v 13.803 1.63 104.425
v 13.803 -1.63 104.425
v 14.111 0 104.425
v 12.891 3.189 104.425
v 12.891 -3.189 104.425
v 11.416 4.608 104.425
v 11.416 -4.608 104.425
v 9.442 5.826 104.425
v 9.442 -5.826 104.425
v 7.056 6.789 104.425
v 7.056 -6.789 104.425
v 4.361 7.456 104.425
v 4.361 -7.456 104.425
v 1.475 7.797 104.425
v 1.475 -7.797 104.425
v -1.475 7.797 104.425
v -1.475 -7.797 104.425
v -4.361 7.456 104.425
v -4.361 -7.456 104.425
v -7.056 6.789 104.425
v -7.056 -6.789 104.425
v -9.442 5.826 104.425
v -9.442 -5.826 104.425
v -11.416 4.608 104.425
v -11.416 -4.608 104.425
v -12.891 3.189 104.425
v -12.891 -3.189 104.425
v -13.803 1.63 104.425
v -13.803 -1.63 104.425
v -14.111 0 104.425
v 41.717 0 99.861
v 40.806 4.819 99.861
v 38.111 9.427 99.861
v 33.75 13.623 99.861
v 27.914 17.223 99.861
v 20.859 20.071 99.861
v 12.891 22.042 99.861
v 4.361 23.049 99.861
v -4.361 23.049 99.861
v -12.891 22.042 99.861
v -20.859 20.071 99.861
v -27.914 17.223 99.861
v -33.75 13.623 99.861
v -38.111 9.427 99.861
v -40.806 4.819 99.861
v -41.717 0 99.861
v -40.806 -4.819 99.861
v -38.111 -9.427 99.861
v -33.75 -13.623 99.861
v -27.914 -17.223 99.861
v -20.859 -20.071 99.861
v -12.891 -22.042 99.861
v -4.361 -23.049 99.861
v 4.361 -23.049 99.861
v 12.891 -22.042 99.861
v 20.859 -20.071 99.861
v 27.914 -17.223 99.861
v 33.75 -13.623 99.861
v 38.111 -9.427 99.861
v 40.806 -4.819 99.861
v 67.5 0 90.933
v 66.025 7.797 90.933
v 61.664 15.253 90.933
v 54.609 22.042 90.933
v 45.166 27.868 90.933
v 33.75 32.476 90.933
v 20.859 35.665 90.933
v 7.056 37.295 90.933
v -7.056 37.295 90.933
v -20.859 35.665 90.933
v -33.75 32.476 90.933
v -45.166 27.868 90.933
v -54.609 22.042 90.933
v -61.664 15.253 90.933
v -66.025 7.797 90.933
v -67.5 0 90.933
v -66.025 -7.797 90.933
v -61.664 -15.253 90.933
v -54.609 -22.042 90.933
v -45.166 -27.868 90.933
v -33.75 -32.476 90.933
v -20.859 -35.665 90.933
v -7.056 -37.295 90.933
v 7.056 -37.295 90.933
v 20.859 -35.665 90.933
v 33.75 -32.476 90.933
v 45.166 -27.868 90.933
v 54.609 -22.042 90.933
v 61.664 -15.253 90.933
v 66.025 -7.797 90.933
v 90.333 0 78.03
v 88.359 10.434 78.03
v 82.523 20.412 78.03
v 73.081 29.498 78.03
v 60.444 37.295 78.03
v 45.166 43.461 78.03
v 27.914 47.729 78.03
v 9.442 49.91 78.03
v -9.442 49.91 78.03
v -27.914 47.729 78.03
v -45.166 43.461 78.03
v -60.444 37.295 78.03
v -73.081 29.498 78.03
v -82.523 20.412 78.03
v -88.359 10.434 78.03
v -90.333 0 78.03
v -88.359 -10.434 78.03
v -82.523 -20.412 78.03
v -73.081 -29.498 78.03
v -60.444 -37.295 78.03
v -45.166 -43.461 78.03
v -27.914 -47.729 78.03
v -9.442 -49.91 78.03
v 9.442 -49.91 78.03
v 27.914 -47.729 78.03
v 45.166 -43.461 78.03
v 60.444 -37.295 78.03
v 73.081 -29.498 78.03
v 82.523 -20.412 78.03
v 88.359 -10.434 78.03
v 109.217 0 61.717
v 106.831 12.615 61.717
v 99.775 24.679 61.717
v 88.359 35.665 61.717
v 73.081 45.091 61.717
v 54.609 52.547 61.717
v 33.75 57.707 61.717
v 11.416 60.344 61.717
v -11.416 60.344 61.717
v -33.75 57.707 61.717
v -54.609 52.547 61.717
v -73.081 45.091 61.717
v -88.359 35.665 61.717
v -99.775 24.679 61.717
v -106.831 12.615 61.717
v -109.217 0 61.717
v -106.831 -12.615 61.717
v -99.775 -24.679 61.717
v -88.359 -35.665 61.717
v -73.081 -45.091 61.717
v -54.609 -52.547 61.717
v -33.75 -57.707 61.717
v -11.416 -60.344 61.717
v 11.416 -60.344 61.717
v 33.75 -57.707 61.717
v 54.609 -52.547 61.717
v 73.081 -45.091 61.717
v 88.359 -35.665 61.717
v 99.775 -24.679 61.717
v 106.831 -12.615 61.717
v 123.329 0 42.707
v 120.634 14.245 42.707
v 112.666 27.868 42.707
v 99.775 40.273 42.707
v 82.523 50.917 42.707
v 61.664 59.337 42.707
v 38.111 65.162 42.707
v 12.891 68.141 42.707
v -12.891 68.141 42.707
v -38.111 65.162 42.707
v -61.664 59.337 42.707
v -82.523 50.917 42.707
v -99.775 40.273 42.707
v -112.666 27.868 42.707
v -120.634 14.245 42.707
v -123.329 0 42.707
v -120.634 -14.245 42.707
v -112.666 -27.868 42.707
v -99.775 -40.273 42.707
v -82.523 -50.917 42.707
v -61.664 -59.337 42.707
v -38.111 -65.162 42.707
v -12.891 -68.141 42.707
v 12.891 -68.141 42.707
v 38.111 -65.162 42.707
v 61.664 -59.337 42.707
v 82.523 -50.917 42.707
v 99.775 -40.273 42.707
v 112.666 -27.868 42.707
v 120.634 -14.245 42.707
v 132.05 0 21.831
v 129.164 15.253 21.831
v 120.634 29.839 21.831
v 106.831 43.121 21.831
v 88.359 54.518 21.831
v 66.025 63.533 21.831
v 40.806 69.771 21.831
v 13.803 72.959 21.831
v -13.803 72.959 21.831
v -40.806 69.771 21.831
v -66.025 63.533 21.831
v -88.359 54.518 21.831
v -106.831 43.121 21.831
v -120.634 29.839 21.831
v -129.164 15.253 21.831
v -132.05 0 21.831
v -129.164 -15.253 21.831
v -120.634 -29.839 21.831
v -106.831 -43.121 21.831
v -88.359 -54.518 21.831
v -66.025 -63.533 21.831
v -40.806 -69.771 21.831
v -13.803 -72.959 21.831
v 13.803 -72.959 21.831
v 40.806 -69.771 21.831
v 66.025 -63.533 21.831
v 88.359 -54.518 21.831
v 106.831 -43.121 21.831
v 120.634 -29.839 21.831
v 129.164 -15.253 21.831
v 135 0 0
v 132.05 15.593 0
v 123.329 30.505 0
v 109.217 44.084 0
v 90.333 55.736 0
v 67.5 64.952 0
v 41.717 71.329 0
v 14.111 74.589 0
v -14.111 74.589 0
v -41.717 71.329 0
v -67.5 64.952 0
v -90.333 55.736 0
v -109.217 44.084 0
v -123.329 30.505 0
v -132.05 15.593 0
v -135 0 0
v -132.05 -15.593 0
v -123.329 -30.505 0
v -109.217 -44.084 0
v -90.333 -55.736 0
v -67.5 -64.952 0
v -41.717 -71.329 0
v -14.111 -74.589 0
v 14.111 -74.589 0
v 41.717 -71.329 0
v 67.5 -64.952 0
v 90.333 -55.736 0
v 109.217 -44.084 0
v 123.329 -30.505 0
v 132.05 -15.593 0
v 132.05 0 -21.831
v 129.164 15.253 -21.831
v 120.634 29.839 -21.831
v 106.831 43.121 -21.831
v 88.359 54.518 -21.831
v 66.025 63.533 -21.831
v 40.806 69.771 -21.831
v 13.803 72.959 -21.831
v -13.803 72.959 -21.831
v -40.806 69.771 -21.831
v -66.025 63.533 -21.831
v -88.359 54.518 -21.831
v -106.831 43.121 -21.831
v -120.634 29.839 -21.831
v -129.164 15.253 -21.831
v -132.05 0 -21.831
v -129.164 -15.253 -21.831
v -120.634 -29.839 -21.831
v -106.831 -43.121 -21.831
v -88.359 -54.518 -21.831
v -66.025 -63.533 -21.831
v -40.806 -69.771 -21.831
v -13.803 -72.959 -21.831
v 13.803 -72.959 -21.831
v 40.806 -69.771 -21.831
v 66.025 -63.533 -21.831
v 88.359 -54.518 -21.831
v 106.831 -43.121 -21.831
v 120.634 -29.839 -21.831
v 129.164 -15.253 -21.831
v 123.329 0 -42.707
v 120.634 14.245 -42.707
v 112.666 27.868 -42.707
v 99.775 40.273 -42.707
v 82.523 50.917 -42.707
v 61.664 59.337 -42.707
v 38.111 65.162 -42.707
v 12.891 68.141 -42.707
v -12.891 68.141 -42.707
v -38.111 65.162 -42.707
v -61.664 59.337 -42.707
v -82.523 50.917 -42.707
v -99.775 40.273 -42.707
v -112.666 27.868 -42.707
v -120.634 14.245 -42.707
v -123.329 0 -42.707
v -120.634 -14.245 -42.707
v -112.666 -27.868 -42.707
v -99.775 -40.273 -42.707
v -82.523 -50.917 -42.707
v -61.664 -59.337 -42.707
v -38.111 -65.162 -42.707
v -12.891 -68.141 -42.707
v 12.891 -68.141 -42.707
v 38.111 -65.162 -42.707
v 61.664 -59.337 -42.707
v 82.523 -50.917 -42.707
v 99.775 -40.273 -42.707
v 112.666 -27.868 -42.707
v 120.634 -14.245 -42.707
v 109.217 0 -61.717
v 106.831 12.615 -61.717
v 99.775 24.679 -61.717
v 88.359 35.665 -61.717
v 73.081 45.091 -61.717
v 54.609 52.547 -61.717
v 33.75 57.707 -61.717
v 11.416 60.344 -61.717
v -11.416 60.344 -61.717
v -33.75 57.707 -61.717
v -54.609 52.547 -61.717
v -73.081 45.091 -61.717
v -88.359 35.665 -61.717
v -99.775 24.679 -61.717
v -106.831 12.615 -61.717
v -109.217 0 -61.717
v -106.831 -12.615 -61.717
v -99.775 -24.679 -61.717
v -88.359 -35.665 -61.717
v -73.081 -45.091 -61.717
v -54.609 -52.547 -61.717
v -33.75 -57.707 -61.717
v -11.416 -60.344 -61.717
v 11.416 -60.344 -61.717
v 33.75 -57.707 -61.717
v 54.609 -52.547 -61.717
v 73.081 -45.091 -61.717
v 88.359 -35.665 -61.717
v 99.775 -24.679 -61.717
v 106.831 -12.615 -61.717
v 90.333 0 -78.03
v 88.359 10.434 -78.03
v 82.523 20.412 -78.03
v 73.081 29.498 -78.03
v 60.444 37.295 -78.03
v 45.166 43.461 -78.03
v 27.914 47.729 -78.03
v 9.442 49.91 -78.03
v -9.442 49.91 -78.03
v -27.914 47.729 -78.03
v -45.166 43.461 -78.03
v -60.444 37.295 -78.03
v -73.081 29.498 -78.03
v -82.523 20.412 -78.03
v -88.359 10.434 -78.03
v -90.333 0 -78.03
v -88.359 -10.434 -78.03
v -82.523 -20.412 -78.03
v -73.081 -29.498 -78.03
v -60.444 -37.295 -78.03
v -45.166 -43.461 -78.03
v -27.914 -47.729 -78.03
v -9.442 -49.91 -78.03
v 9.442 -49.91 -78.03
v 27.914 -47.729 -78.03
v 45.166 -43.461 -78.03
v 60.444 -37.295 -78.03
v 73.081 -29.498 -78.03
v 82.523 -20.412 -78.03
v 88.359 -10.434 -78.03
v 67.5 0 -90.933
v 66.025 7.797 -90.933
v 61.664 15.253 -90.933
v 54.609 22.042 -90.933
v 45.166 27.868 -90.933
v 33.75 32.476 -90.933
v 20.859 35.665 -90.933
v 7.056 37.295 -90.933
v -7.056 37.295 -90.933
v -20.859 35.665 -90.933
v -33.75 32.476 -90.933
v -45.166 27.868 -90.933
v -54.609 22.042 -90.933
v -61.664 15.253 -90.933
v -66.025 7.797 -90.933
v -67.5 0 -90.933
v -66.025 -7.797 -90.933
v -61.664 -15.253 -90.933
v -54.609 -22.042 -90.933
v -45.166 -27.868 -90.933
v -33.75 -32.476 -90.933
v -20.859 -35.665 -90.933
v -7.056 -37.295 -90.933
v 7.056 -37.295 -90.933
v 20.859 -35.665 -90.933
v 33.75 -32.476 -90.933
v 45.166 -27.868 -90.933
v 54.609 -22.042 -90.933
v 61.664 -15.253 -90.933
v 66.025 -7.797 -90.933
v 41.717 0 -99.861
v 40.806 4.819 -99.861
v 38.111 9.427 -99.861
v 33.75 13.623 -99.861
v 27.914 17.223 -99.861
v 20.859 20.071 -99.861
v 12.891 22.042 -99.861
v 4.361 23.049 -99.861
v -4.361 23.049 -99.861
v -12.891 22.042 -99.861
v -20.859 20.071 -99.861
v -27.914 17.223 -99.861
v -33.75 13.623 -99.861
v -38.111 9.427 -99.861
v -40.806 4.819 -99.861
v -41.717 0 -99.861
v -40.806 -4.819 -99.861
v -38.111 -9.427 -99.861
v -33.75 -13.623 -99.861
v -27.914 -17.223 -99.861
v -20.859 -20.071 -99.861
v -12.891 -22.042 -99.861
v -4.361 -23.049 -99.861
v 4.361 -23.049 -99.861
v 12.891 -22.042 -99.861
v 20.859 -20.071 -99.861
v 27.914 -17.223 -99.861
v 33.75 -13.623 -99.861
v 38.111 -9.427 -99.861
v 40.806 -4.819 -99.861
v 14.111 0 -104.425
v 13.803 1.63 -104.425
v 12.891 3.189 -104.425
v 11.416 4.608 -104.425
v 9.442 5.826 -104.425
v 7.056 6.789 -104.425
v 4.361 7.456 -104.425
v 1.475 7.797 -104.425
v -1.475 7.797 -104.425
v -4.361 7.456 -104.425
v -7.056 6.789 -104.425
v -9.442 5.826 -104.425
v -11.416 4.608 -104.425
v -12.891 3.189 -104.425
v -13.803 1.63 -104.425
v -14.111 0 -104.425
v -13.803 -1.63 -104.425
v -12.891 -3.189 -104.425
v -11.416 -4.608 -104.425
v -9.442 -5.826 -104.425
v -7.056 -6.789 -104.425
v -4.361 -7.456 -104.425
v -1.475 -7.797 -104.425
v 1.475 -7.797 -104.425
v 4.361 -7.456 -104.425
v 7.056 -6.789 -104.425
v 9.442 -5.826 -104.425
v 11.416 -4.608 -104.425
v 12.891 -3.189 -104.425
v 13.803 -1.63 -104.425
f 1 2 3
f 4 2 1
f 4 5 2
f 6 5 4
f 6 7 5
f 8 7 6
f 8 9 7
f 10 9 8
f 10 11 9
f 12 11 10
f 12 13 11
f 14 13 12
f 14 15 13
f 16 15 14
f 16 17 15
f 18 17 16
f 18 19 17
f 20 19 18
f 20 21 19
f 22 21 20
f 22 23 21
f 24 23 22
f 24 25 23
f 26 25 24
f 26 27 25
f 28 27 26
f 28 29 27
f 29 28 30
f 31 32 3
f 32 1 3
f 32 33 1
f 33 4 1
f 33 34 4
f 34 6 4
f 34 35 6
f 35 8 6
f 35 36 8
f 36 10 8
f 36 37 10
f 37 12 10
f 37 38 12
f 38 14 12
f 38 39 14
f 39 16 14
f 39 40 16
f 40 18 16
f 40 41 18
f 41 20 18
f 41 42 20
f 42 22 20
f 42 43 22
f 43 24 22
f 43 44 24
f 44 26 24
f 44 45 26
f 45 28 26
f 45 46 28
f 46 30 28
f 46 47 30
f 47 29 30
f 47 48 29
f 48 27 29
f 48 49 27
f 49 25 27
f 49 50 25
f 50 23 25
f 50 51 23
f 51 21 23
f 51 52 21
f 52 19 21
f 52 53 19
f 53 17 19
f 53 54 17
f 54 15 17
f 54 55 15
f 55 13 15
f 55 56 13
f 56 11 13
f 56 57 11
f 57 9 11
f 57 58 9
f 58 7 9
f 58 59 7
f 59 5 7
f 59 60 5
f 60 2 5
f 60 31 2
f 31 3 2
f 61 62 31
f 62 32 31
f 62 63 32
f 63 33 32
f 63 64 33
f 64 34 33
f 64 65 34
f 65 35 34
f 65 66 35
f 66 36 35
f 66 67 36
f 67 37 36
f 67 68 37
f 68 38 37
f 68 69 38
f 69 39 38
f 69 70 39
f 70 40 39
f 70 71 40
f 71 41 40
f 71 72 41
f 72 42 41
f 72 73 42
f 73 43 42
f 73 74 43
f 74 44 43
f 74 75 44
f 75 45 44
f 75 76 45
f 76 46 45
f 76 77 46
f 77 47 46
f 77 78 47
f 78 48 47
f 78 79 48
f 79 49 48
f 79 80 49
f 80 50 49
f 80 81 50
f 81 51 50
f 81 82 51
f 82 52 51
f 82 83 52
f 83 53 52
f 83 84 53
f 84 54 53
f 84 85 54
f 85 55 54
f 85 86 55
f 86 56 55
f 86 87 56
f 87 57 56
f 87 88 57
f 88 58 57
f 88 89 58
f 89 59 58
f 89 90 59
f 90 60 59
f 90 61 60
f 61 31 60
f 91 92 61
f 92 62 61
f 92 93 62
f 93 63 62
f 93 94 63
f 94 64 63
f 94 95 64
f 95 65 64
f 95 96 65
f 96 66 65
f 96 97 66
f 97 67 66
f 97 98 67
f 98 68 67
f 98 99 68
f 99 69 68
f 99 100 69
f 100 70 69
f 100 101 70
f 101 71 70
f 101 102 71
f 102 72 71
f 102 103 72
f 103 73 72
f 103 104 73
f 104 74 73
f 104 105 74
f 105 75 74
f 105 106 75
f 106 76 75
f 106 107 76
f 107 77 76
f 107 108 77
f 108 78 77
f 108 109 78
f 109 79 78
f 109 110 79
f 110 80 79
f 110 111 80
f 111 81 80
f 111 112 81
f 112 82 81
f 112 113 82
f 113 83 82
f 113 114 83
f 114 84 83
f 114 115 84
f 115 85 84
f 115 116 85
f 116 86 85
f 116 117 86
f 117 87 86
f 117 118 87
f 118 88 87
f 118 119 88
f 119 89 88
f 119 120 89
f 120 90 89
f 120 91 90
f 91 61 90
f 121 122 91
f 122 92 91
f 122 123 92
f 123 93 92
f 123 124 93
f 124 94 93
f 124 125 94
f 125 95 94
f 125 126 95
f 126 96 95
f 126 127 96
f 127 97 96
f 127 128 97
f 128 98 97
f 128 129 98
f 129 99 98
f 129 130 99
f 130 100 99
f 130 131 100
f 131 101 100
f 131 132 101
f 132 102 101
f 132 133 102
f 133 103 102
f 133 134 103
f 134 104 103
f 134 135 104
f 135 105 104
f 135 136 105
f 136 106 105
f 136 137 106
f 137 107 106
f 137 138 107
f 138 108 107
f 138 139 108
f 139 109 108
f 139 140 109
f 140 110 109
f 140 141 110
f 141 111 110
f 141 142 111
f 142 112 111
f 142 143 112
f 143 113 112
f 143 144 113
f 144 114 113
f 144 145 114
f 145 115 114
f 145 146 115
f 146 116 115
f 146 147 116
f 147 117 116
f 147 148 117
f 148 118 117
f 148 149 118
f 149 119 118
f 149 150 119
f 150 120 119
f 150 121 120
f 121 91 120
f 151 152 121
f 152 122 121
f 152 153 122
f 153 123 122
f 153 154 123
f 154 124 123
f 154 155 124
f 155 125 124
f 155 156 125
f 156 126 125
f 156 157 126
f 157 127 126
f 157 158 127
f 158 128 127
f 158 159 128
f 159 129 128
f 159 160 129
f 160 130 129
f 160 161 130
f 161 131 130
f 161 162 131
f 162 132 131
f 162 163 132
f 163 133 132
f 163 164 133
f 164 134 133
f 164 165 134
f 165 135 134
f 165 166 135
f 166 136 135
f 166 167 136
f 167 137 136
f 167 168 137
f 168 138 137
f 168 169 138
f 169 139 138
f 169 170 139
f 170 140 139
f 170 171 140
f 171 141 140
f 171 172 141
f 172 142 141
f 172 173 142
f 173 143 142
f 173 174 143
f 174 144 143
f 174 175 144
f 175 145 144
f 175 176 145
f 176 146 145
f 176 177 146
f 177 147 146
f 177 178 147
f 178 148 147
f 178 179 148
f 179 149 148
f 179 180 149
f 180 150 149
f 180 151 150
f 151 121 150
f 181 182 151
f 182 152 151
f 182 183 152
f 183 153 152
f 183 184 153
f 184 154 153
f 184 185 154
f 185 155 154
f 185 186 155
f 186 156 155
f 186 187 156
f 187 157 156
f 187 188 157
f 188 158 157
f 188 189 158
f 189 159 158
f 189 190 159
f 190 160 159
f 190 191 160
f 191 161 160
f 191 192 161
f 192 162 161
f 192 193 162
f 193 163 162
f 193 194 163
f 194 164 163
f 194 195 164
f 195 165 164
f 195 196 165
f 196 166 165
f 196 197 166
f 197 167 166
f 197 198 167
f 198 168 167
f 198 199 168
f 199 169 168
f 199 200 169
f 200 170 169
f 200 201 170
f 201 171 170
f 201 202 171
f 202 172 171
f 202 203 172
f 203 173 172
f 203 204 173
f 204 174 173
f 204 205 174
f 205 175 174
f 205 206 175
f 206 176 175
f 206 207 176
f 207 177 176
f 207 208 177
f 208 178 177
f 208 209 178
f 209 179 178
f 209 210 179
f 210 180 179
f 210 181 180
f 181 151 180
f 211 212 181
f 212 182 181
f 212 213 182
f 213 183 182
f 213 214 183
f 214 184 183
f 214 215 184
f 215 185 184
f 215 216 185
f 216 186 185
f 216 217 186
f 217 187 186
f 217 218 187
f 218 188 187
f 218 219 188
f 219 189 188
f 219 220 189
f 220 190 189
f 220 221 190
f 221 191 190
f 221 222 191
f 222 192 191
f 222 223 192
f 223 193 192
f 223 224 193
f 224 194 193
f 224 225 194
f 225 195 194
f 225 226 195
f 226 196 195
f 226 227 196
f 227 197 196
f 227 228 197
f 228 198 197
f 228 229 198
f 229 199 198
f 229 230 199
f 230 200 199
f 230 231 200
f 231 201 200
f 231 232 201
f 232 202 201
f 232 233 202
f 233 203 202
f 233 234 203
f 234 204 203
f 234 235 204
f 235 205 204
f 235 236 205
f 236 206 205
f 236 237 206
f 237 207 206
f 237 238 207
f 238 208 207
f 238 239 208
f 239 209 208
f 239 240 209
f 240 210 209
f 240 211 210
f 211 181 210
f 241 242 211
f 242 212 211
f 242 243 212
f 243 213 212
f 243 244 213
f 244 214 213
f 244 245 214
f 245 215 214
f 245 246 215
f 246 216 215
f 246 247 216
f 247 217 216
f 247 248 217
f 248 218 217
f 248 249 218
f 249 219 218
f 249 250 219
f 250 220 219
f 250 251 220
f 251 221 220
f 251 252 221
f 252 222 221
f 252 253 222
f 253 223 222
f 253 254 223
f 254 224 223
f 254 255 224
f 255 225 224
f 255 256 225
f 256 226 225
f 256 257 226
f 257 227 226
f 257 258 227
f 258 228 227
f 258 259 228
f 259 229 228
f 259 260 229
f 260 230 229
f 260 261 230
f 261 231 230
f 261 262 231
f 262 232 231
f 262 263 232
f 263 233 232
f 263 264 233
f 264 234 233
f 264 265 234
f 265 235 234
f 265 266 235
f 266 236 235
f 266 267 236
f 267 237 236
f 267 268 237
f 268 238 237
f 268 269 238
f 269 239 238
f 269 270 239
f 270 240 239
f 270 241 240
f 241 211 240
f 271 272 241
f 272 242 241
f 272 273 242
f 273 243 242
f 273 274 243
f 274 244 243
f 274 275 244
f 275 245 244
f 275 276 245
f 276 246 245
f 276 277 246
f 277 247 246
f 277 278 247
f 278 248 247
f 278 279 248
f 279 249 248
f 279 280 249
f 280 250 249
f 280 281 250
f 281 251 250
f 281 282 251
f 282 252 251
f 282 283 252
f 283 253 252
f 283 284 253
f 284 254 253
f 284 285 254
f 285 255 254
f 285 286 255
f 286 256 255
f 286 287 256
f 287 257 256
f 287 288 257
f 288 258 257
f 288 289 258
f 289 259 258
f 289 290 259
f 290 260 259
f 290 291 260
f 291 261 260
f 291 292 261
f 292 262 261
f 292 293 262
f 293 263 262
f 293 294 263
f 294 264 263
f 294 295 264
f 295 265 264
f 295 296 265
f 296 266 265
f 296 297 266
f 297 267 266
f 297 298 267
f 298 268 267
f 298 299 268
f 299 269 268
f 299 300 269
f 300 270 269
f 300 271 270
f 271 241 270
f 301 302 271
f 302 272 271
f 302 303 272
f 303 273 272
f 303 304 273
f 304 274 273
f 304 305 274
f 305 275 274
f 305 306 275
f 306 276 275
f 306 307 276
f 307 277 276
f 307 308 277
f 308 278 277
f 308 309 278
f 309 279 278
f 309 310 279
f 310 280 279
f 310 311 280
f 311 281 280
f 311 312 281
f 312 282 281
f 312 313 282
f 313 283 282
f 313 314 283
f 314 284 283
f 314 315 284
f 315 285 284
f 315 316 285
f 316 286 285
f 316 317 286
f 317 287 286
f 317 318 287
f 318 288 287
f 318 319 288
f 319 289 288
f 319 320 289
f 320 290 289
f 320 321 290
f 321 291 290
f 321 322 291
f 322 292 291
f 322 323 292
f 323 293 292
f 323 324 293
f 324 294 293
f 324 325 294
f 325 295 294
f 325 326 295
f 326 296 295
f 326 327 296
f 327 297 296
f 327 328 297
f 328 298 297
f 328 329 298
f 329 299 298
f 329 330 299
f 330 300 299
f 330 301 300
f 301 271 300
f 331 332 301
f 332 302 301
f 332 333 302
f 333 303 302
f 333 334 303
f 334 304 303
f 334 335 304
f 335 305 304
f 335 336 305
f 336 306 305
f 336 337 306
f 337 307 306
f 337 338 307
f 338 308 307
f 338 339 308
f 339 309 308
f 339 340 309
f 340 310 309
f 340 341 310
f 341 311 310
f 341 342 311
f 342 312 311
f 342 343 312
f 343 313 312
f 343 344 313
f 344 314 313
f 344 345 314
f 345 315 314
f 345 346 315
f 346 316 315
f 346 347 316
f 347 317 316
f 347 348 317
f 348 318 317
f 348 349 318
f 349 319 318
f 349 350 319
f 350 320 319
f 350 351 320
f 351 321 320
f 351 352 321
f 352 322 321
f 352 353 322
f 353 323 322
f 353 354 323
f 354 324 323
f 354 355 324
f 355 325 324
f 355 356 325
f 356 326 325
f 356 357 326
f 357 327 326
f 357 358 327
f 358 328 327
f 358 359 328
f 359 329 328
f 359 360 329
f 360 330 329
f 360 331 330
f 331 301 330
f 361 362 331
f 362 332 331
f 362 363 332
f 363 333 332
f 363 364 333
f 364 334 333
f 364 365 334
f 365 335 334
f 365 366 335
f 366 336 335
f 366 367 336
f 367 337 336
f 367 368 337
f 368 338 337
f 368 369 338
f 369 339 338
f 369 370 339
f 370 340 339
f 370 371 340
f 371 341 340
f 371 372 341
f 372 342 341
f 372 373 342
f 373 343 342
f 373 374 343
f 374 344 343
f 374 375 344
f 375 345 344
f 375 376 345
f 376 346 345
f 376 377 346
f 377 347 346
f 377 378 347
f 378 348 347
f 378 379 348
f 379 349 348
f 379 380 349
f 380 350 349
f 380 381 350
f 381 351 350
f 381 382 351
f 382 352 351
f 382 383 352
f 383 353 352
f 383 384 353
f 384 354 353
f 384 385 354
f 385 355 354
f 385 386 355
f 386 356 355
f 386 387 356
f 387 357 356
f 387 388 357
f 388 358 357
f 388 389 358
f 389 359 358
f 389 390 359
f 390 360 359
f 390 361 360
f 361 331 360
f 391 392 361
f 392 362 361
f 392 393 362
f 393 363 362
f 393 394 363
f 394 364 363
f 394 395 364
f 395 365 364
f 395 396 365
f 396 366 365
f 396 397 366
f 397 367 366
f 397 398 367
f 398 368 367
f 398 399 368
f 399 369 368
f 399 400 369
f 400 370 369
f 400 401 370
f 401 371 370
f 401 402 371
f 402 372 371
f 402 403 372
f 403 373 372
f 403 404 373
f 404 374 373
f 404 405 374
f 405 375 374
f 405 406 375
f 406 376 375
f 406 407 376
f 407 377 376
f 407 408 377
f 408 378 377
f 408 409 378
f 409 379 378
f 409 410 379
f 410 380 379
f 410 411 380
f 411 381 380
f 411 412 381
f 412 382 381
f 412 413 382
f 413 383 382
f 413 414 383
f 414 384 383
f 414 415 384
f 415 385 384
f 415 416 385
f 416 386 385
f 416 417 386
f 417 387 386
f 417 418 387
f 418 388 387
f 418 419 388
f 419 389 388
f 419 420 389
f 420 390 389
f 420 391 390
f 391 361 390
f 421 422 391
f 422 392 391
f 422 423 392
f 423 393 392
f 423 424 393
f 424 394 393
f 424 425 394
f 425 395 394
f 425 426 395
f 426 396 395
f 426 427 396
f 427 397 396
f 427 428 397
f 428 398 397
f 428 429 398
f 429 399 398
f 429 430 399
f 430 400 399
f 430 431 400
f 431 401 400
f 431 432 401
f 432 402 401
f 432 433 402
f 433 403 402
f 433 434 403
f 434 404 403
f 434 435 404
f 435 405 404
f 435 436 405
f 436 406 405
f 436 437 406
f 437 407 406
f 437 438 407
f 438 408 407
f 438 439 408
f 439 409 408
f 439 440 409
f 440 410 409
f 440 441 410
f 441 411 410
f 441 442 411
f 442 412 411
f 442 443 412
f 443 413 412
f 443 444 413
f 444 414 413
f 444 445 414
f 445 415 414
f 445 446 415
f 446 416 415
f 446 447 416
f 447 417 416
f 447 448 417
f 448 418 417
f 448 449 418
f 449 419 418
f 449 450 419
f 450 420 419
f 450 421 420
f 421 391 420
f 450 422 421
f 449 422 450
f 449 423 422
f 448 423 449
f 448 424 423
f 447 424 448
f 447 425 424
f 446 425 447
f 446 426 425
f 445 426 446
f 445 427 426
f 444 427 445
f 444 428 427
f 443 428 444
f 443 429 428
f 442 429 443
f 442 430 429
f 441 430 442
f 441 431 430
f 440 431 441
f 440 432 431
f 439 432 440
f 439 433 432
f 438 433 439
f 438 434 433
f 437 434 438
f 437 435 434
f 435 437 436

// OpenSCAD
// Generated by SolidPython 1.0.1 on 2020-07-29 00:46:48


scale(v = [9, 5, 7]) {
	sphere(r = 15);
}
/***********************************************
*********      SolidPython code:      **********
************************************************
 
# import packages: SolidPython
from solid import *
from solid.utils import *
from itertools import chain, combinations, permutations


class Resize:

    def __init__(self, scad_file):
        self.scad_file = scad_file
        #self.scad_file = import_scad(scad_file)
        # cone/cylinder param:
        self.r1 = 0
        self.r2 = 0
        self.h = 0
        # rectangular prism param:
        self.w = 0
        self.l = 0
        # ellipse param:
        self.r = 0

    # import OpenScad code (file name corresponds to shape)


    # classify shape + parameters
    def assign(self, param1, param2, param3):
        if self.scad_file == 'cone.scad':
            self.r1 = param1
            self.r2 = param2
            self.h = param3
        elif self.scad_file == 'cylinder.scad':
            self.r1 = param1
            self.r2 = param2
            self.h = param3
        elif self.scad_file == 'rectangularPrism.scad':
            self.h = param1
            self.l = param2
            self.w = param3
        else:
            self.r = param1
            self.h = param2

    # resize parameters
    def iterate(self):
        x = range(3, 20, 2)
        i = 1
        if self.scad_file == 'cone.scad':
            tempList = list(permutations(x, 2))
            for temp in tempList:
                param1 = temp[0]
                param2 = temp[1]
                filepath = 'produced_scad_files/' + 'cone' + str(param1) + '_' + str(param2) + '_' + '.scad'
                scad_render_to_file(cylinder(h=param1, r1=param2, r2=0), filepath)

        elif self.scad_file == 'cylinder.scad':
            tempList = list(permutations(x, 3))
            for temp in tempList:
                param1 = temp[0]
                param2 = temp[1]
                filepath = 'produced_scad_files/' + 'cylinder' + str(param1) + '_' + str(param2) + '_' + '.scad'
                scad_render_to_file(cylinder(h=param1, r1=param2, r2=param2), filepath)

        elif self.scad_file == 'rectangularPrism.scad':
            tempList = list(permutations(x, 3))
            for temp in tempList:
                param1 = temp[0]
                param2 = temp[1]
                param3 = temp[2]
                filepath = 'produced_scad_files/' + 'rectangularPrism' + str(param1) + '_' + str(param2) + '_' + str(
                    param3) + '.scad'
                scad_render_to_file(cube(size=(param1, param2, param3)), filepath)

        elif self.scad_file == 'ellipse.scad':
            tempList = list(permutations(x, 4))
            for temp in tempList:
                param1 = temp[0]
                param2 = temp[1]
                param3 = temp[2]
                param4 = temp[3]
                filepath = 'produced_scad_files/' + 'ellipse' + str(param1) + '_' + str(param2) + '_' + str(param3) + '_' + str(param4) + '.scad'
                scad_render_to_file(scale([param1, param2, param3])(sphere(r=param4)), filepath)

    def render_to_scadfile(self):
        scad_render_to_file(scad, 'example.scad') 
 
************************************************/
